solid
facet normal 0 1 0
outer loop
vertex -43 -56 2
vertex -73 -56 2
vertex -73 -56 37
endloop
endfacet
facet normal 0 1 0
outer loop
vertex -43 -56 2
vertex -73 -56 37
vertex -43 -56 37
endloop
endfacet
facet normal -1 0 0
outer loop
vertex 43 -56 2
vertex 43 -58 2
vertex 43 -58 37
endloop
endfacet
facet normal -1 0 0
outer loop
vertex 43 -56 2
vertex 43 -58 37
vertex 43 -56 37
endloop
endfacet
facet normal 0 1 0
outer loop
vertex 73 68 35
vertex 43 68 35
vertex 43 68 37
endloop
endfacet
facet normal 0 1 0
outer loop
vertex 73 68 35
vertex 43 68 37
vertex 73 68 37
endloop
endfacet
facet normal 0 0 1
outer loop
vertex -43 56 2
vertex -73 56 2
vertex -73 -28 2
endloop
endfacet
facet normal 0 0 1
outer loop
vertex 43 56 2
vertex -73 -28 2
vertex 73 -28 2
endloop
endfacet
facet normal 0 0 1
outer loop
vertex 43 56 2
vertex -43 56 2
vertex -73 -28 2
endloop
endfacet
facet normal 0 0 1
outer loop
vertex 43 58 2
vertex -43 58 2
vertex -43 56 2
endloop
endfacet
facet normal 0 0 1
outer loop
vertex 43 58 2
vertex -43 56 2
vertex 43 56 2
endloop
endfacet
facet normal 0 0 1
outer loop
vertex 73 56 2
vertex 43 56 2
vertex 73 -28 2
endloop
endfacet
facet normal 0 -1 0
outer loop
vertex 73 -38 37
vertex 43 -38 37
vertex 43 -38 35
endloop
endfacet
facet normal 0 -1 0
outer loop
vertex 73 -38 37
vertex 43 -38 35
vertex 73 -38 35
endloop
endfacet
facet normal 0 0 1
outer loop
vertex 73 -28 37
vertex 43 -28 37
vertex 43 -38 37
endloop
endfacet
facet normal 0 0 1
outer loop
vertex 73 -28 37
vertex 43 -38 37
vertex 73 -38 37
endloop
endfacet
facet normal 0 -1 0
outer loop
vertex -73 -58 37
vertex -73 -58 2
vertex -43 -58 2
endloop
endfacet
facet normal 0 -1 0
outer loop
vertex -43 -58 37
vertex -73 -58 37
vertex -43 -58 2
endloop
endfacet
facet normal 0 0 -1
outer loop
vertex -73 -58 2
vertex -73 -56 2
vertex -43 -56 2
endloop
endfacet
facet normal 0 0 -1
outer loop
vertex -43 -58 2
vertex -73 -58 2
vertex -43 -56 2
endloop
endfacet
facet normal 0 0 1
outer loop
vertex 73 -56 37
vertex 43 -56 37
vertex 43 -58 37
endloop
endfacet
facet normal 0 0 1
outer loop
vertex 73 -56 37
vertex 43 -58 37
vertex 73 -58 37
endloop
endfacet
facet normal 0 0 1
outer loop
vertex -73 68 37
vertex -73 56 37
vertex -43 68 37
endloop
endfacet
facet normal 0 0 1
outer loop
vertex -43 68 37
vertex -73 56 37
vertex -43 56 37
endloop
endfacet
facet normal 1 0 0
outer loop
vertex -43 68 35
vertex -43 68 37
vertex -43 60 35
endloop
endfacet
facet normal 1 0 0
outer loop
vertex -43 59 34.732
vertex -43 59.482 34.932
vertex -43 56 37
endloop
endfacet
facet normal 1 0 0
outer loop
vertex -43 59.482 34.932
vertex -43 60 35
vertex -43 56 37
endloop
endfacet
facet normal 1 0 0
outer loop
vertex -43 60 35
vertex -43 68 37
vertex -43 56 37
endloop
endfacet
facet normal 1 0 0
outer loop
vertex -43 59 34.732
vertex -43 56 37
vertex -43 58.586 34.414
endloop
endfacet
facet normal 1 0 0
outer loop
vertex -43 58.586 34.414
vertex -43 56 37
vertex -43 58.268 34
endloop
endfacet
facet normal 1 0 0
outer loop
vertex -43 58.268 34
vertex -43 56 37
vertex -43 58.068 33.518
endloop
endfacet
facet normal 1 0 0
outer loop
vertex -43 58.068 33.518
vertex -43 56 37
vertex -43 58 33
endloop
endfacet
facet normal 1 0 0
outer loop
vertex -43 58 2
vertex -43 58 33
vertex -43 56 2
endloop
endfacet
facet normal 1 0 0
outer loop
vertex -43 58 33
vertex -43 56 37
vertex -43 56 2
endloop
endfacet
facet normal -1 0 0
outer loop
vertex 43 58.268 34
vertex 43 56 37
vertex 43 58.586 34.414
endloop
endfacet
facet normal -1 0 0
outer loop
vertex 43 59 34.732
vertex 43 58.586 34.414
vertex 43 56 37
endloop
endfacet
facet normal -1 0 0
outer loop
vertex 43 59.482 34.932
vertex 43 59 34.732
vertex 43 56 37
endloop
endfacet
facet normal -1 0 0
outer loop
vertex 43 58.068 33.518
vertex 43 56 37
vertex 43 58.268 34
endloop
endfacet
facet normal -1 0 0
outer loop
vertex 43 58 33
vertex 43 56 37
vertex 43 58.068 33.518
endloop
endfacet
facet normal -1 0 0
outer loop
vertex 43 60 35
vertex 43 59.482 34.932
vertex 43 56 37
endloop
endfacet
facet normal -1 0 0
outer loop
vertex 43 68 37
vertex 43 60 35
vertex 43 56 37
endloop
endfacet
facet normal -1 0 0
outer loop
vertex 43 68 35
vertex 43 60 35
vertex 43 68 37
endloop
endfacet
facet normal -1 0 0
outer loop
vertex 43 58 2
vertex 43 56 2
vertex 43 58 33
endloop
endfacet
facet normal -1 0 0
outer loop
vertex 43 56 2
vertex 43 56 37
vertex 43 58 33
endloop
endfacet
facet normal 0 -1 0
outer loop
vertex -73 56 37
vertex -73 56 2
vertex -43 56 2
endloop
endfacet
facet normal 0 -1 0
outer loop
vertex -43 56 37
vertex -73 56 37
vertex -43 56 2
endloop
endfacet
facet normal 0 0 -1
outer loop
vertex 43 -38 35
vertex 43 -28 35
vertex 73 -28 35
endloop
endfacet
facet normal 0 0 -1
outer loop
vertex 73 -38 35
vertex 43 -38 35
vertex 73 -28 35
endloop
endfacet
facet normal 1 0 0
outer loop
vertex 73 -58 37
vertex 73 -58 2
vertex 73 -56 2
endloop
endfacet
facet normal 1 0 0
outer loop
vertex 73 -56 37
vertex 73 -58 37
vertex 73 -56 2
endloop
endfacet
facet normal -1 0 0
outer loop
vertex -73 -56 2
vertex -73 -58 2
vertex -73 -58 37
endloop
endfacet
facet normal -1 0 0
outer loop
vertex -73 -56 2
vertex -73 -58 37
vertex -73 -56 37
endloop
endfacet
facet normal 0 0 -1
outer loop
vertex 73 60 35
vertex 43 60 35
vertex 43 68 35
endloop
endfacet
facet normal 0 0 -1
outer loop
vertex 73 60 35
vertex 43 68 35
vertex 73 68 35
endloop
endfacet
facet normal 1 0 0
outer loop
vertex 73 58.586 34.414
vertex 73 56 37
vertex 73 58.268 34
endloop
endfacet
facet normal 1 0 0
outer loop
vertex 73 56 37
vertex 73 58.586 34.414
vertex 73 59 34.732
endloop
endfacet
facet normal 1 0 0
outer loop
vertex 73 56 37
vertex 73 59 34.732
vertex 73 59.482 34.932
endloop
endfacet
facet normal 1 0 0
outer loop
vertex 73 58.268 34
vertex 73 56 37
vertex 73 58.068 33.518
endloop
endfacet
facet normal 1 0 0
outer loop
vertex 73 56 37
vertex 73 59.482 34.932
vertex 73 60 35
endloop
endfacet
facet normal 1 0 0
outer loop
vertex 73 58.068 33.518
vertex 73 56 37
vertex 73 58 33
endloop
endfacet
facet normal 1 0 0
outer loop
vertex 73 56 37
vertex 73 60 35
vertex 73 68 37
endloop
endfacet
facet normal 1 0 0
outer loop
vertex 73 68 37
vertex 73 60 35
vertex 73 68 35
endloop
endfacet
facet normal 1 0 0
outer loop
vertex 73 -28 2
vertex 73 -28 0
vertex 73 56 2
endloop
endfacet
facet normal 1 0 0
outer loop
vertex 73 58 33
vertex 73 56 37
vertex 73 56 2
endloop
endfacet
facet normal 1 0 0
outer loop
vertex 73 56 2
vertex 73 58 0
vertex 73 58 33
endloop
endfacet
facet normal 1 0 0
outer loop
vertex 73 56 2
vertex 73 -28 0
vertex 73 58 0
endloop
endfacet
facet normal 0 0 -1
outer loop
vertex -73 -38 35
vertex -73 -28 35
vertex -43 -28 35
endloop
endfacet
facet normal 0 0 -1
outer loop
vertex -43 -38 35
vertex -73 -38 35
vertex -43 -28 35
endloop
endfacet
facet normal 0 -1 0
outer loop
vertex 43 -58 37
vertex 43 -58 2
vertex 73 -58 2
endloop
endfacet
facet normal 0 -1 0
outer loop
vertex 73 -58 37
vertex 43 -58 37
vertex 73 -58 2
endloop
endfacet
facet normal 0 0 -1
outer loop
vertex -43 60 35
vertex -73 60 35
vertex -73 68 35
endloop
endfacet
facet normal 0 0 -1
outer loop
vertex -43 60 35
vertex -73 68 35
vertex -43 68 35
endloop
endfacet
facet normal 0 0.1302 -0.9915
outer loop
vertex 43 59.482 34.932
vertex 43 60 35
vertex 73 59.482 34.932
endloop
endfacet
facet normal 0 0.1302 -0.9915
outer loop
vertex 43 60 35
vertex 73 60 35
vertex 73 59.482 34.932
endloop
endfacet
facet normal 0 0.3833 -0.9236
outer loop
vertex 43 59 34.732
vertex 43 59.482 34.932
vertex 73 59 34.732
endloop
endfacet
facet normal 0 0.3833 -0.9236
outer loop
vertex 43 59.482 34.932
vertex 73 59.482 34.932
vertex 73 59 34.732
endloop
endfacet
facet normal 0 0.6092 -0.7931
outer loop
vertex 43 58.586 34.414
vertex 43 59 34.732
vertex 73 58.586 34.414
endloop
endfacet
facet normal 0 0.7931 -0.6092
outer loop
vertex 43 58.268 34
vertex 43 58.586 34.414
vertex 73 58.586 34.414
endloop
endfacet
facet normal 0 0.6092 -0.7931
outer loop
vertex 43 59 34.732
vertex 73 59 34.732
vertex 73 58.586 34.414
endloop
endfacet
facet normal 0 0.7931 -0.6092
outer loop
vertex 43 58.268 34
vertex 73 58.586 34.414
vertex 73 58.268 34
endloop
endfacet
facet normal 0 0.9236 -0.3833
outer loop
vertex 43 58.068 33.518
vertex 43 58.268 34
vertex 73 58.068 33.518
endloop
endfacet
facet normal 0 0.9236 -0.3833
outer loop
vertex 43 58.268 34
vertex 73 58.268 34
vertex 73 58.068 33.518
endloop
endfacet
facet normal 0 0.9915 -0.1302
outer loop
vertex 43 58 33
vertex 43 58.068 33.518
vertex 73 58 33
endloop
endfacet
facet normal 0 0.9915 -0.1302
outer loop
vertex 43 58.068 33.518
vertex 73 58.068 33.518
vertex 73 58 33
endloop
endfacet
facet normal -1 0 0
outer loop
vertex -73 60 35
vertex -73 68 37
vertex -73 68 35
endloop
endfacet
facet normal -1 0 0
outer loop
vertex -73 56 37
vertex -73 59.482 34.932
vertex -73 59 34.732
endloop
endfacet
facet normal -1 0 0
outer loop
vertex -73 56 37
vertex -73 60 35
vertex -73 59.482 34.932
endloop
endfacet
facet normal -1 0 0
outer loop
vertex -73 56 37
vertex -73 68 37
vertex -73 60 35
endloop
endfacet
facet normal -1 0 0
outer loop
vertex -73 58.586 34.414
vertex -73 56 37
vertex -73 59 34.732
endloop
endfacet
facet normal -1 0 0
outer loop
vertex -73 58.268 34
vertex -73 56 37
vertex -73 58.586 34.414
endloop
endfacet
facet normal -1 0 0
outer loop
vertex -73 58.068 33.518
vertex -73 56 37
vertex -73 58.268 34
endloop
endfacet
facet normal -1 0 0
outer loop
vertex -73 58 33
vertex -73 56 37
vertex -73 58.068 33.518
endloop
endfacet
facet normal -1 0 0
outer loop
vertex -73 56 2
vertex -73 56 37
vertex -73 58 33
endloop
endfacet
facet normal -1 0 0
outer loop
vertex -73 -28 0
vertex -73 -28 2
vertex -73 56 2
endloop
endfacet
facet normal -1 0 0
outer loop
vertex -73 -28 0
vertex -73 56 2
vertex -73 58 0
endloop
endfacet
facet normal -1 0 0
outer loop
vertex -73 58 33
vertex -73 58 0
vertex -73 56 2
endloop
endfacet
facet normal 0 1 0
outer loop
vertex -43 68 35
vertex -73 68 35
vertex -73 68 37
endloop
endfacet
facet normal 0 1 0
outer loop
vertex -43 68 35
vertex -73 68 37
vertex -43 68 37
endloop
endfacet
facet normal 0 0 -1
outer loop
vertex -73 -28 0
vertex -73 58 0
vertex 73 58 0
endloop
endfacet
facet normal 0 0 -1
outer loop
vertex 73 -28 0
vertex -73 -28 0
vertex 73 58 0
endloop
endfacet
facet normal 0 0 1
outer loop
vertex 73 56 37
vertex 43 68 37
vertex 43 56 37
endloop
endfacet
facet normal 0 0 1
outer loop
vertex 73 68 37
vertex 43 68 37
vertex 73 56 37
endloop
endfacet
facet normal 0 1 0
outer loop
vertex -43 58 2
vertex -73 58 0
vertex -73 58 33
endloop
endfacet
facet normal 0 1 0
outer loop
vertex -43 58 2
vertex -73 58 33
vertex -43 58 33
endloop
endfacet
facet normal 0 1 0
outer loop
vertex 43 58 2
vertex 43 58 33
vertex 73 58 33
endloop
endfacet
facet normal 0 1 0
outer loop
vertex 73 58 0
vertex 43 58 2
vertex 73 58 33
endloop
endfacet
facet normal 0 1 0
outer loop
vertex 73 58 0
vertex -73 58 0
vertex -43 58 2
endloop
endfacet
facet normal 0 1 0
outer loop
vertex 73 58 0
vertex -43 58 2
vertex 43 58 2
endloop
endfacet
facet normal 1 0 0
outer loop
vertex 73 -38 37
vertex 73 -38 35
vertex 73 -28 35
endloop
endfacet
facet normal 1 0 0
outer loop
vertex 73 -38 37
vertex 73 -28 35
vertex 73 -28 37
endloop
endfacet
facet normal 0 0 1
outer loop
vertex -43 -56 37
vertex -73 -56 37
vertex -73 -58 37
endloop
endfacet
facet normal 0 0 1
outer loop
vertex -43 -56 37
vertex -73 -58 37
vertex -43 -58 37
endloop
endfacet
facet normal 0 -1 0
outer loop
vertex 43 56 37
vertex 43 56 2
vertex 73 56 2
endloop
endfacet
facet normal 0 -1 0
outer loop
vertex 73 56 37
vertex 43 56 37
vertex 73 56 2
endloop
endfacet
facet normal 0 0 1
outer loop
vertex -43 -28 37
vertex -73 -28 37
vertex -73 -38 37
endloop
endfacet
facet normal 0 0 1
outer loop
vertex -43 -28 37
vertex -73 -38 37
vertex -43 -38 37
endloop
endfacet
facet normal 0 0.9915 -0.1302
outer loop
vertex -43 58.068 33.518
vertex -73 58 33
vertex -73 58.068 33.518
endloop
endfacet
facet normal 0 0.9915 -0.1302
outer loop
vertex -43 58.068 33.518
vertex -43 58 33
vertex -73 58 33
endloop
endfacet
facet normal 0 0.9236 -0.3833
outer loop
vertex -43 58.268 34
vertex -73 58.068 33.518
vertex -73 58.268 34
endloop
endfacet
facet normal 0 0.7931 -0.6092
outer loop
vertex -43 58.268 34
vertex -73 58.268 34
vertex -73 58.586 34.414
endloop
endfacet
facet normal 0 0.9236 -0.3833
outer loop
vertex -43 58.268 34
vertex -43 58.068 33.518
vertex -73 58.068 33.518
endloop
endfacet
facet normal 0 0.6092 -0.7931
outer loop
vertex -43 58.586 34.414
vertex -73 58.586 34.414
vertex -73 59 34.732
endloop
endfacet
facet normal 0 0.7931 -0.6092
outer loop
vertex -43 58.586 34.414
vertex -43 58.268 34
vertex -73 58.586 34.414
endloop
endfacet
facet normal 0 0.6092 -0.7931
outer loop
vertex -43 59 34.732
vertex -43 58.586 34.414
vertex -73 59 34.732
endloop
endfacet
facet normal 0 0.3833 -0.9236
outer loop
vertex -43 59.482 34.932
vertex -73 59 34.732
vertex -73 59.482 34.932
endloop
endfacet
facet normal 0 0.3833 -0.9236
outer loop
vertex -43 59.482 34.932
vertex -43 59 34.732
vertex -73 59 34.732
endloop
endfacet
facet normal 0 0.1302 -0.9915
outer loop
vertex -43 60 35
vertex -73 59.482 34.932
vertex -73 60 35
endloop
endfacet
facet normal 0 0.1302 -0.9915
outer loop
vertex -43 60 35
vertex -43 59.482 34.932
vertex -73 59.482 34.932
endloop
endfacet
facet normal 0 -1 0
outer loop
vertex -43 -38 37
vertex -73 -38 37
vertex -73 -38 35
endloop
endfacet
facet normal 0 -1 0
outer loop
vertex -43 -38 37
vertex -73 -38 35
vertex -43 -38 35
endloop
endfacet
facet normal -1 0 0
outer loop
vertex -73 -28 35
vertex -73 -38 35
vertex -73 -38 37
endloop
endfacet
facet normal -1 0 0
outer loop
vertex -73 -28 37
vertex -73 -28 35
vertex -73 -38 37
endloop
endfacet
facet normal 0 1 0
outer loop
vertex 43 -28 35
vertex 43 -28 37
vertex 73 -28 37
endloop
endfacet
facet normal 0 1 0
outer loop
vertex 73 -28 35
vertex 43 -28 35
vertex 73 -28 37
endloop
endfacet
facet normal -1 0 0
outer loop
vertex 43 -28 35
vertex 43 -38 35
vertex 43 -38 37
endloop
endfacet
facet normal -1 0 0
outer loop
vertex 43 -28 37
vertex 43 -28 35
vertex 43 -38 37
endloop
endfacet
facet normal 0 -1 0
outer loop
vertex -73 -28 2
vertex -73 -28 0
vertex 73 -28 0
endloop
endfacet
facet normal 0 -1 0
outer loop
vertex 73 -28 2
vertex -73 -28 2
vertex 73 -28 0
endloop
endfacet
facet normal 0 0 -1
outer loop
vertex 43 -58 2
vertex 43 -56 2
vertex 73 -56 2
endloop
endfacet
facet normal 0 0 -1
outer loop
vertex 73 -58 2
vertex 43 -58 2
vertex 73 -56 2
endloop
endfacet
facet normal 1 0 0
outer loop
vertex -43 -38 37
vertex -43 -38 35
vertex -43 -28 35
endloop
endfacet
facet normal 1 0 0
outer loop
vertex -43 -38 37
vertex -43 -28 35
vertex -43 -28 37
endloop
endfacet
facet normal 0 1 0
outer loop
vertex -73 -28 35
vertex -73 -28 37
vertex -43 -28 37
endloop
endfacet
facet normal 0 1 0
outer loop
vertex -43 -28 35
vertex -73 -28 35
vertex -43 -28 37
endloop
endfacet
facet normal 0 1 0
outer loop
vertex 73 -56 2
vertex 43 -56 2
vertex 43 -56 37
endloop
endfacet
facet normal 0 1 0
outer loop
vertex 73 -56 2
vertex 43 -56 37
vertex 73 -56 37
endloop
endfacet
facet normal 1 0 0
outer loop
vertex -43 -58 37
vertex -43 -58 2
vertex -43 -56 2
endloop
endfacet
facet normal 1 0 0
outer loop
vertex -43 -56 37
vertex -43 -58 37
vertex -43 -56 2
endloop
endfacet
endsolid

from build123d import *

# Parameters (mm, degrees)
ESQUISSE1_W          = 146
ESQUISSE1_H          = 86
BOSS_EXTRU_1_DEPTH   = 2
ESQUISSE2_W          = 30
ESQUISSE2_H          = 2
BOSS_EXTRU_2_DEPTH   = 35
ESQUISSE3_W          = 30
ESQUISSE3_H          = 2
BOSS_EXTRU_3_DEPTH   = 10
ESQUISSE4_W          = 30
ESQUISSE4_H          = 2
BOSS_EXTRU_4_DEPTH   = 10
BOSS_EXTRU_4_2_DEPTH = 10
CONG_1_R             = 2


with BuildPart() as part:
    # Esquisse1 → Boss.-Extru.1 (new body)
    with BuildSketch(Plane.XY):
        with Locations((0, 15)):
            Rectangle(ESQUISSE1_W, ESQUISSE1_H)
    extrude(amount=BOSS_EXTRU_1_DEPTH)

    # Esquisse2 → Boss.-Extru.2 (add)
    with BuildSketch(Plane.XY.offset(2)):
        with Locations((-58, 57)):
            Rectangle(ESQUISSE2_W, ESQUISSE2_H)
        with Locations((58, 57)):
            Rectangle(ESQUISSE2_W, ESQUISSE2_H)
        with Locations((58, -57)):
            Rectangle(ESQUISSE2_W, ESQUISSE2_H)
        with Locations((-58, -57)):
            Rectangle(ESQUISSE2_W, ESQUISSE2_H)
    extrude(amount=BOSS_EXTRU_2_DEPTH)


with BuildPart() as boss_extru_2_piece_1:
    # of the separate pieces the step leaves, piece 1, a body of its own (boss_extru_2_pieces)
    add(part.part.solids().sort_by_distance((-73, 58, 0))[0])

    # Esquisse3 → Boss.-Extru.3 (add)
    with BuildSketch(Plane(origin=(0, 58, 0), x_dir=(1, 0, 0), z_dir=(0, 1, 0))):
        with Locations((-58, -36)):
            Rectangle(ESQUISSE3_W, ESQUISSE3_H)
        with Locations((58, -36)):
            Rectangle(ESQUISSE3_W, ESQUISSE3_H)
    extrude(amount=BOSS_EXTRU_3_DEPTH)

    # Congé1
    cong_1_edges = [boss_extru_2_piece_1.edges().sort_by_distance(p)[0] for p in [
        (-58, 58, 35),
        (58, 58, 35),
    ]]
    fillet(cong_1_edges, radius=CONG_1_R)


with BuildPart() as boss_extru_2_piece_2:
    # of the separate pieces the step leaves, piece 2, a body of its own (boss_extru_2_pieces)
    add(part.part.solids().sort_by_distance((73, -58, 2))[0])


with BuildPart() as boss_extru_2_piece_3:
    # of the separate pieces the step leaves, piece 3, a body of its own (boss_extru_2_pieces)
    add(part.part.solids().sort_by_distance((-43, -58, 2))[0])


with BuildPart() as body_4:
    # Esquisse4 → Boss.-Extru.4 (new body)
    with BuildSketch(Plane.XZ.offset(28)):
        with Locations((-58, 36)):
            Rectangle(ESQUISSE4_W, ESQUISSE4_H)
    extrude(amount=BOSS_EXTRU_4_DEPTH)


with BuildPart() as body_5:
    # Esquisse4 → Boss.-Extru.4 2 (new body)
    with BuildSketch(Plane.XZ.offset(28)):
        with Locations((58, 36)):
            Rectangle(ESQUISSE4_W, ESQUISSE4_H)
    extrude(amount=BOSS_EXTRU_4_2_DEPTH)


solid = Compound([boss_extru_2_piece_1.part, boss_extru_2_piece_2.part, boss_extru_2_piece_3.part, body_4.part, body_5.part])
